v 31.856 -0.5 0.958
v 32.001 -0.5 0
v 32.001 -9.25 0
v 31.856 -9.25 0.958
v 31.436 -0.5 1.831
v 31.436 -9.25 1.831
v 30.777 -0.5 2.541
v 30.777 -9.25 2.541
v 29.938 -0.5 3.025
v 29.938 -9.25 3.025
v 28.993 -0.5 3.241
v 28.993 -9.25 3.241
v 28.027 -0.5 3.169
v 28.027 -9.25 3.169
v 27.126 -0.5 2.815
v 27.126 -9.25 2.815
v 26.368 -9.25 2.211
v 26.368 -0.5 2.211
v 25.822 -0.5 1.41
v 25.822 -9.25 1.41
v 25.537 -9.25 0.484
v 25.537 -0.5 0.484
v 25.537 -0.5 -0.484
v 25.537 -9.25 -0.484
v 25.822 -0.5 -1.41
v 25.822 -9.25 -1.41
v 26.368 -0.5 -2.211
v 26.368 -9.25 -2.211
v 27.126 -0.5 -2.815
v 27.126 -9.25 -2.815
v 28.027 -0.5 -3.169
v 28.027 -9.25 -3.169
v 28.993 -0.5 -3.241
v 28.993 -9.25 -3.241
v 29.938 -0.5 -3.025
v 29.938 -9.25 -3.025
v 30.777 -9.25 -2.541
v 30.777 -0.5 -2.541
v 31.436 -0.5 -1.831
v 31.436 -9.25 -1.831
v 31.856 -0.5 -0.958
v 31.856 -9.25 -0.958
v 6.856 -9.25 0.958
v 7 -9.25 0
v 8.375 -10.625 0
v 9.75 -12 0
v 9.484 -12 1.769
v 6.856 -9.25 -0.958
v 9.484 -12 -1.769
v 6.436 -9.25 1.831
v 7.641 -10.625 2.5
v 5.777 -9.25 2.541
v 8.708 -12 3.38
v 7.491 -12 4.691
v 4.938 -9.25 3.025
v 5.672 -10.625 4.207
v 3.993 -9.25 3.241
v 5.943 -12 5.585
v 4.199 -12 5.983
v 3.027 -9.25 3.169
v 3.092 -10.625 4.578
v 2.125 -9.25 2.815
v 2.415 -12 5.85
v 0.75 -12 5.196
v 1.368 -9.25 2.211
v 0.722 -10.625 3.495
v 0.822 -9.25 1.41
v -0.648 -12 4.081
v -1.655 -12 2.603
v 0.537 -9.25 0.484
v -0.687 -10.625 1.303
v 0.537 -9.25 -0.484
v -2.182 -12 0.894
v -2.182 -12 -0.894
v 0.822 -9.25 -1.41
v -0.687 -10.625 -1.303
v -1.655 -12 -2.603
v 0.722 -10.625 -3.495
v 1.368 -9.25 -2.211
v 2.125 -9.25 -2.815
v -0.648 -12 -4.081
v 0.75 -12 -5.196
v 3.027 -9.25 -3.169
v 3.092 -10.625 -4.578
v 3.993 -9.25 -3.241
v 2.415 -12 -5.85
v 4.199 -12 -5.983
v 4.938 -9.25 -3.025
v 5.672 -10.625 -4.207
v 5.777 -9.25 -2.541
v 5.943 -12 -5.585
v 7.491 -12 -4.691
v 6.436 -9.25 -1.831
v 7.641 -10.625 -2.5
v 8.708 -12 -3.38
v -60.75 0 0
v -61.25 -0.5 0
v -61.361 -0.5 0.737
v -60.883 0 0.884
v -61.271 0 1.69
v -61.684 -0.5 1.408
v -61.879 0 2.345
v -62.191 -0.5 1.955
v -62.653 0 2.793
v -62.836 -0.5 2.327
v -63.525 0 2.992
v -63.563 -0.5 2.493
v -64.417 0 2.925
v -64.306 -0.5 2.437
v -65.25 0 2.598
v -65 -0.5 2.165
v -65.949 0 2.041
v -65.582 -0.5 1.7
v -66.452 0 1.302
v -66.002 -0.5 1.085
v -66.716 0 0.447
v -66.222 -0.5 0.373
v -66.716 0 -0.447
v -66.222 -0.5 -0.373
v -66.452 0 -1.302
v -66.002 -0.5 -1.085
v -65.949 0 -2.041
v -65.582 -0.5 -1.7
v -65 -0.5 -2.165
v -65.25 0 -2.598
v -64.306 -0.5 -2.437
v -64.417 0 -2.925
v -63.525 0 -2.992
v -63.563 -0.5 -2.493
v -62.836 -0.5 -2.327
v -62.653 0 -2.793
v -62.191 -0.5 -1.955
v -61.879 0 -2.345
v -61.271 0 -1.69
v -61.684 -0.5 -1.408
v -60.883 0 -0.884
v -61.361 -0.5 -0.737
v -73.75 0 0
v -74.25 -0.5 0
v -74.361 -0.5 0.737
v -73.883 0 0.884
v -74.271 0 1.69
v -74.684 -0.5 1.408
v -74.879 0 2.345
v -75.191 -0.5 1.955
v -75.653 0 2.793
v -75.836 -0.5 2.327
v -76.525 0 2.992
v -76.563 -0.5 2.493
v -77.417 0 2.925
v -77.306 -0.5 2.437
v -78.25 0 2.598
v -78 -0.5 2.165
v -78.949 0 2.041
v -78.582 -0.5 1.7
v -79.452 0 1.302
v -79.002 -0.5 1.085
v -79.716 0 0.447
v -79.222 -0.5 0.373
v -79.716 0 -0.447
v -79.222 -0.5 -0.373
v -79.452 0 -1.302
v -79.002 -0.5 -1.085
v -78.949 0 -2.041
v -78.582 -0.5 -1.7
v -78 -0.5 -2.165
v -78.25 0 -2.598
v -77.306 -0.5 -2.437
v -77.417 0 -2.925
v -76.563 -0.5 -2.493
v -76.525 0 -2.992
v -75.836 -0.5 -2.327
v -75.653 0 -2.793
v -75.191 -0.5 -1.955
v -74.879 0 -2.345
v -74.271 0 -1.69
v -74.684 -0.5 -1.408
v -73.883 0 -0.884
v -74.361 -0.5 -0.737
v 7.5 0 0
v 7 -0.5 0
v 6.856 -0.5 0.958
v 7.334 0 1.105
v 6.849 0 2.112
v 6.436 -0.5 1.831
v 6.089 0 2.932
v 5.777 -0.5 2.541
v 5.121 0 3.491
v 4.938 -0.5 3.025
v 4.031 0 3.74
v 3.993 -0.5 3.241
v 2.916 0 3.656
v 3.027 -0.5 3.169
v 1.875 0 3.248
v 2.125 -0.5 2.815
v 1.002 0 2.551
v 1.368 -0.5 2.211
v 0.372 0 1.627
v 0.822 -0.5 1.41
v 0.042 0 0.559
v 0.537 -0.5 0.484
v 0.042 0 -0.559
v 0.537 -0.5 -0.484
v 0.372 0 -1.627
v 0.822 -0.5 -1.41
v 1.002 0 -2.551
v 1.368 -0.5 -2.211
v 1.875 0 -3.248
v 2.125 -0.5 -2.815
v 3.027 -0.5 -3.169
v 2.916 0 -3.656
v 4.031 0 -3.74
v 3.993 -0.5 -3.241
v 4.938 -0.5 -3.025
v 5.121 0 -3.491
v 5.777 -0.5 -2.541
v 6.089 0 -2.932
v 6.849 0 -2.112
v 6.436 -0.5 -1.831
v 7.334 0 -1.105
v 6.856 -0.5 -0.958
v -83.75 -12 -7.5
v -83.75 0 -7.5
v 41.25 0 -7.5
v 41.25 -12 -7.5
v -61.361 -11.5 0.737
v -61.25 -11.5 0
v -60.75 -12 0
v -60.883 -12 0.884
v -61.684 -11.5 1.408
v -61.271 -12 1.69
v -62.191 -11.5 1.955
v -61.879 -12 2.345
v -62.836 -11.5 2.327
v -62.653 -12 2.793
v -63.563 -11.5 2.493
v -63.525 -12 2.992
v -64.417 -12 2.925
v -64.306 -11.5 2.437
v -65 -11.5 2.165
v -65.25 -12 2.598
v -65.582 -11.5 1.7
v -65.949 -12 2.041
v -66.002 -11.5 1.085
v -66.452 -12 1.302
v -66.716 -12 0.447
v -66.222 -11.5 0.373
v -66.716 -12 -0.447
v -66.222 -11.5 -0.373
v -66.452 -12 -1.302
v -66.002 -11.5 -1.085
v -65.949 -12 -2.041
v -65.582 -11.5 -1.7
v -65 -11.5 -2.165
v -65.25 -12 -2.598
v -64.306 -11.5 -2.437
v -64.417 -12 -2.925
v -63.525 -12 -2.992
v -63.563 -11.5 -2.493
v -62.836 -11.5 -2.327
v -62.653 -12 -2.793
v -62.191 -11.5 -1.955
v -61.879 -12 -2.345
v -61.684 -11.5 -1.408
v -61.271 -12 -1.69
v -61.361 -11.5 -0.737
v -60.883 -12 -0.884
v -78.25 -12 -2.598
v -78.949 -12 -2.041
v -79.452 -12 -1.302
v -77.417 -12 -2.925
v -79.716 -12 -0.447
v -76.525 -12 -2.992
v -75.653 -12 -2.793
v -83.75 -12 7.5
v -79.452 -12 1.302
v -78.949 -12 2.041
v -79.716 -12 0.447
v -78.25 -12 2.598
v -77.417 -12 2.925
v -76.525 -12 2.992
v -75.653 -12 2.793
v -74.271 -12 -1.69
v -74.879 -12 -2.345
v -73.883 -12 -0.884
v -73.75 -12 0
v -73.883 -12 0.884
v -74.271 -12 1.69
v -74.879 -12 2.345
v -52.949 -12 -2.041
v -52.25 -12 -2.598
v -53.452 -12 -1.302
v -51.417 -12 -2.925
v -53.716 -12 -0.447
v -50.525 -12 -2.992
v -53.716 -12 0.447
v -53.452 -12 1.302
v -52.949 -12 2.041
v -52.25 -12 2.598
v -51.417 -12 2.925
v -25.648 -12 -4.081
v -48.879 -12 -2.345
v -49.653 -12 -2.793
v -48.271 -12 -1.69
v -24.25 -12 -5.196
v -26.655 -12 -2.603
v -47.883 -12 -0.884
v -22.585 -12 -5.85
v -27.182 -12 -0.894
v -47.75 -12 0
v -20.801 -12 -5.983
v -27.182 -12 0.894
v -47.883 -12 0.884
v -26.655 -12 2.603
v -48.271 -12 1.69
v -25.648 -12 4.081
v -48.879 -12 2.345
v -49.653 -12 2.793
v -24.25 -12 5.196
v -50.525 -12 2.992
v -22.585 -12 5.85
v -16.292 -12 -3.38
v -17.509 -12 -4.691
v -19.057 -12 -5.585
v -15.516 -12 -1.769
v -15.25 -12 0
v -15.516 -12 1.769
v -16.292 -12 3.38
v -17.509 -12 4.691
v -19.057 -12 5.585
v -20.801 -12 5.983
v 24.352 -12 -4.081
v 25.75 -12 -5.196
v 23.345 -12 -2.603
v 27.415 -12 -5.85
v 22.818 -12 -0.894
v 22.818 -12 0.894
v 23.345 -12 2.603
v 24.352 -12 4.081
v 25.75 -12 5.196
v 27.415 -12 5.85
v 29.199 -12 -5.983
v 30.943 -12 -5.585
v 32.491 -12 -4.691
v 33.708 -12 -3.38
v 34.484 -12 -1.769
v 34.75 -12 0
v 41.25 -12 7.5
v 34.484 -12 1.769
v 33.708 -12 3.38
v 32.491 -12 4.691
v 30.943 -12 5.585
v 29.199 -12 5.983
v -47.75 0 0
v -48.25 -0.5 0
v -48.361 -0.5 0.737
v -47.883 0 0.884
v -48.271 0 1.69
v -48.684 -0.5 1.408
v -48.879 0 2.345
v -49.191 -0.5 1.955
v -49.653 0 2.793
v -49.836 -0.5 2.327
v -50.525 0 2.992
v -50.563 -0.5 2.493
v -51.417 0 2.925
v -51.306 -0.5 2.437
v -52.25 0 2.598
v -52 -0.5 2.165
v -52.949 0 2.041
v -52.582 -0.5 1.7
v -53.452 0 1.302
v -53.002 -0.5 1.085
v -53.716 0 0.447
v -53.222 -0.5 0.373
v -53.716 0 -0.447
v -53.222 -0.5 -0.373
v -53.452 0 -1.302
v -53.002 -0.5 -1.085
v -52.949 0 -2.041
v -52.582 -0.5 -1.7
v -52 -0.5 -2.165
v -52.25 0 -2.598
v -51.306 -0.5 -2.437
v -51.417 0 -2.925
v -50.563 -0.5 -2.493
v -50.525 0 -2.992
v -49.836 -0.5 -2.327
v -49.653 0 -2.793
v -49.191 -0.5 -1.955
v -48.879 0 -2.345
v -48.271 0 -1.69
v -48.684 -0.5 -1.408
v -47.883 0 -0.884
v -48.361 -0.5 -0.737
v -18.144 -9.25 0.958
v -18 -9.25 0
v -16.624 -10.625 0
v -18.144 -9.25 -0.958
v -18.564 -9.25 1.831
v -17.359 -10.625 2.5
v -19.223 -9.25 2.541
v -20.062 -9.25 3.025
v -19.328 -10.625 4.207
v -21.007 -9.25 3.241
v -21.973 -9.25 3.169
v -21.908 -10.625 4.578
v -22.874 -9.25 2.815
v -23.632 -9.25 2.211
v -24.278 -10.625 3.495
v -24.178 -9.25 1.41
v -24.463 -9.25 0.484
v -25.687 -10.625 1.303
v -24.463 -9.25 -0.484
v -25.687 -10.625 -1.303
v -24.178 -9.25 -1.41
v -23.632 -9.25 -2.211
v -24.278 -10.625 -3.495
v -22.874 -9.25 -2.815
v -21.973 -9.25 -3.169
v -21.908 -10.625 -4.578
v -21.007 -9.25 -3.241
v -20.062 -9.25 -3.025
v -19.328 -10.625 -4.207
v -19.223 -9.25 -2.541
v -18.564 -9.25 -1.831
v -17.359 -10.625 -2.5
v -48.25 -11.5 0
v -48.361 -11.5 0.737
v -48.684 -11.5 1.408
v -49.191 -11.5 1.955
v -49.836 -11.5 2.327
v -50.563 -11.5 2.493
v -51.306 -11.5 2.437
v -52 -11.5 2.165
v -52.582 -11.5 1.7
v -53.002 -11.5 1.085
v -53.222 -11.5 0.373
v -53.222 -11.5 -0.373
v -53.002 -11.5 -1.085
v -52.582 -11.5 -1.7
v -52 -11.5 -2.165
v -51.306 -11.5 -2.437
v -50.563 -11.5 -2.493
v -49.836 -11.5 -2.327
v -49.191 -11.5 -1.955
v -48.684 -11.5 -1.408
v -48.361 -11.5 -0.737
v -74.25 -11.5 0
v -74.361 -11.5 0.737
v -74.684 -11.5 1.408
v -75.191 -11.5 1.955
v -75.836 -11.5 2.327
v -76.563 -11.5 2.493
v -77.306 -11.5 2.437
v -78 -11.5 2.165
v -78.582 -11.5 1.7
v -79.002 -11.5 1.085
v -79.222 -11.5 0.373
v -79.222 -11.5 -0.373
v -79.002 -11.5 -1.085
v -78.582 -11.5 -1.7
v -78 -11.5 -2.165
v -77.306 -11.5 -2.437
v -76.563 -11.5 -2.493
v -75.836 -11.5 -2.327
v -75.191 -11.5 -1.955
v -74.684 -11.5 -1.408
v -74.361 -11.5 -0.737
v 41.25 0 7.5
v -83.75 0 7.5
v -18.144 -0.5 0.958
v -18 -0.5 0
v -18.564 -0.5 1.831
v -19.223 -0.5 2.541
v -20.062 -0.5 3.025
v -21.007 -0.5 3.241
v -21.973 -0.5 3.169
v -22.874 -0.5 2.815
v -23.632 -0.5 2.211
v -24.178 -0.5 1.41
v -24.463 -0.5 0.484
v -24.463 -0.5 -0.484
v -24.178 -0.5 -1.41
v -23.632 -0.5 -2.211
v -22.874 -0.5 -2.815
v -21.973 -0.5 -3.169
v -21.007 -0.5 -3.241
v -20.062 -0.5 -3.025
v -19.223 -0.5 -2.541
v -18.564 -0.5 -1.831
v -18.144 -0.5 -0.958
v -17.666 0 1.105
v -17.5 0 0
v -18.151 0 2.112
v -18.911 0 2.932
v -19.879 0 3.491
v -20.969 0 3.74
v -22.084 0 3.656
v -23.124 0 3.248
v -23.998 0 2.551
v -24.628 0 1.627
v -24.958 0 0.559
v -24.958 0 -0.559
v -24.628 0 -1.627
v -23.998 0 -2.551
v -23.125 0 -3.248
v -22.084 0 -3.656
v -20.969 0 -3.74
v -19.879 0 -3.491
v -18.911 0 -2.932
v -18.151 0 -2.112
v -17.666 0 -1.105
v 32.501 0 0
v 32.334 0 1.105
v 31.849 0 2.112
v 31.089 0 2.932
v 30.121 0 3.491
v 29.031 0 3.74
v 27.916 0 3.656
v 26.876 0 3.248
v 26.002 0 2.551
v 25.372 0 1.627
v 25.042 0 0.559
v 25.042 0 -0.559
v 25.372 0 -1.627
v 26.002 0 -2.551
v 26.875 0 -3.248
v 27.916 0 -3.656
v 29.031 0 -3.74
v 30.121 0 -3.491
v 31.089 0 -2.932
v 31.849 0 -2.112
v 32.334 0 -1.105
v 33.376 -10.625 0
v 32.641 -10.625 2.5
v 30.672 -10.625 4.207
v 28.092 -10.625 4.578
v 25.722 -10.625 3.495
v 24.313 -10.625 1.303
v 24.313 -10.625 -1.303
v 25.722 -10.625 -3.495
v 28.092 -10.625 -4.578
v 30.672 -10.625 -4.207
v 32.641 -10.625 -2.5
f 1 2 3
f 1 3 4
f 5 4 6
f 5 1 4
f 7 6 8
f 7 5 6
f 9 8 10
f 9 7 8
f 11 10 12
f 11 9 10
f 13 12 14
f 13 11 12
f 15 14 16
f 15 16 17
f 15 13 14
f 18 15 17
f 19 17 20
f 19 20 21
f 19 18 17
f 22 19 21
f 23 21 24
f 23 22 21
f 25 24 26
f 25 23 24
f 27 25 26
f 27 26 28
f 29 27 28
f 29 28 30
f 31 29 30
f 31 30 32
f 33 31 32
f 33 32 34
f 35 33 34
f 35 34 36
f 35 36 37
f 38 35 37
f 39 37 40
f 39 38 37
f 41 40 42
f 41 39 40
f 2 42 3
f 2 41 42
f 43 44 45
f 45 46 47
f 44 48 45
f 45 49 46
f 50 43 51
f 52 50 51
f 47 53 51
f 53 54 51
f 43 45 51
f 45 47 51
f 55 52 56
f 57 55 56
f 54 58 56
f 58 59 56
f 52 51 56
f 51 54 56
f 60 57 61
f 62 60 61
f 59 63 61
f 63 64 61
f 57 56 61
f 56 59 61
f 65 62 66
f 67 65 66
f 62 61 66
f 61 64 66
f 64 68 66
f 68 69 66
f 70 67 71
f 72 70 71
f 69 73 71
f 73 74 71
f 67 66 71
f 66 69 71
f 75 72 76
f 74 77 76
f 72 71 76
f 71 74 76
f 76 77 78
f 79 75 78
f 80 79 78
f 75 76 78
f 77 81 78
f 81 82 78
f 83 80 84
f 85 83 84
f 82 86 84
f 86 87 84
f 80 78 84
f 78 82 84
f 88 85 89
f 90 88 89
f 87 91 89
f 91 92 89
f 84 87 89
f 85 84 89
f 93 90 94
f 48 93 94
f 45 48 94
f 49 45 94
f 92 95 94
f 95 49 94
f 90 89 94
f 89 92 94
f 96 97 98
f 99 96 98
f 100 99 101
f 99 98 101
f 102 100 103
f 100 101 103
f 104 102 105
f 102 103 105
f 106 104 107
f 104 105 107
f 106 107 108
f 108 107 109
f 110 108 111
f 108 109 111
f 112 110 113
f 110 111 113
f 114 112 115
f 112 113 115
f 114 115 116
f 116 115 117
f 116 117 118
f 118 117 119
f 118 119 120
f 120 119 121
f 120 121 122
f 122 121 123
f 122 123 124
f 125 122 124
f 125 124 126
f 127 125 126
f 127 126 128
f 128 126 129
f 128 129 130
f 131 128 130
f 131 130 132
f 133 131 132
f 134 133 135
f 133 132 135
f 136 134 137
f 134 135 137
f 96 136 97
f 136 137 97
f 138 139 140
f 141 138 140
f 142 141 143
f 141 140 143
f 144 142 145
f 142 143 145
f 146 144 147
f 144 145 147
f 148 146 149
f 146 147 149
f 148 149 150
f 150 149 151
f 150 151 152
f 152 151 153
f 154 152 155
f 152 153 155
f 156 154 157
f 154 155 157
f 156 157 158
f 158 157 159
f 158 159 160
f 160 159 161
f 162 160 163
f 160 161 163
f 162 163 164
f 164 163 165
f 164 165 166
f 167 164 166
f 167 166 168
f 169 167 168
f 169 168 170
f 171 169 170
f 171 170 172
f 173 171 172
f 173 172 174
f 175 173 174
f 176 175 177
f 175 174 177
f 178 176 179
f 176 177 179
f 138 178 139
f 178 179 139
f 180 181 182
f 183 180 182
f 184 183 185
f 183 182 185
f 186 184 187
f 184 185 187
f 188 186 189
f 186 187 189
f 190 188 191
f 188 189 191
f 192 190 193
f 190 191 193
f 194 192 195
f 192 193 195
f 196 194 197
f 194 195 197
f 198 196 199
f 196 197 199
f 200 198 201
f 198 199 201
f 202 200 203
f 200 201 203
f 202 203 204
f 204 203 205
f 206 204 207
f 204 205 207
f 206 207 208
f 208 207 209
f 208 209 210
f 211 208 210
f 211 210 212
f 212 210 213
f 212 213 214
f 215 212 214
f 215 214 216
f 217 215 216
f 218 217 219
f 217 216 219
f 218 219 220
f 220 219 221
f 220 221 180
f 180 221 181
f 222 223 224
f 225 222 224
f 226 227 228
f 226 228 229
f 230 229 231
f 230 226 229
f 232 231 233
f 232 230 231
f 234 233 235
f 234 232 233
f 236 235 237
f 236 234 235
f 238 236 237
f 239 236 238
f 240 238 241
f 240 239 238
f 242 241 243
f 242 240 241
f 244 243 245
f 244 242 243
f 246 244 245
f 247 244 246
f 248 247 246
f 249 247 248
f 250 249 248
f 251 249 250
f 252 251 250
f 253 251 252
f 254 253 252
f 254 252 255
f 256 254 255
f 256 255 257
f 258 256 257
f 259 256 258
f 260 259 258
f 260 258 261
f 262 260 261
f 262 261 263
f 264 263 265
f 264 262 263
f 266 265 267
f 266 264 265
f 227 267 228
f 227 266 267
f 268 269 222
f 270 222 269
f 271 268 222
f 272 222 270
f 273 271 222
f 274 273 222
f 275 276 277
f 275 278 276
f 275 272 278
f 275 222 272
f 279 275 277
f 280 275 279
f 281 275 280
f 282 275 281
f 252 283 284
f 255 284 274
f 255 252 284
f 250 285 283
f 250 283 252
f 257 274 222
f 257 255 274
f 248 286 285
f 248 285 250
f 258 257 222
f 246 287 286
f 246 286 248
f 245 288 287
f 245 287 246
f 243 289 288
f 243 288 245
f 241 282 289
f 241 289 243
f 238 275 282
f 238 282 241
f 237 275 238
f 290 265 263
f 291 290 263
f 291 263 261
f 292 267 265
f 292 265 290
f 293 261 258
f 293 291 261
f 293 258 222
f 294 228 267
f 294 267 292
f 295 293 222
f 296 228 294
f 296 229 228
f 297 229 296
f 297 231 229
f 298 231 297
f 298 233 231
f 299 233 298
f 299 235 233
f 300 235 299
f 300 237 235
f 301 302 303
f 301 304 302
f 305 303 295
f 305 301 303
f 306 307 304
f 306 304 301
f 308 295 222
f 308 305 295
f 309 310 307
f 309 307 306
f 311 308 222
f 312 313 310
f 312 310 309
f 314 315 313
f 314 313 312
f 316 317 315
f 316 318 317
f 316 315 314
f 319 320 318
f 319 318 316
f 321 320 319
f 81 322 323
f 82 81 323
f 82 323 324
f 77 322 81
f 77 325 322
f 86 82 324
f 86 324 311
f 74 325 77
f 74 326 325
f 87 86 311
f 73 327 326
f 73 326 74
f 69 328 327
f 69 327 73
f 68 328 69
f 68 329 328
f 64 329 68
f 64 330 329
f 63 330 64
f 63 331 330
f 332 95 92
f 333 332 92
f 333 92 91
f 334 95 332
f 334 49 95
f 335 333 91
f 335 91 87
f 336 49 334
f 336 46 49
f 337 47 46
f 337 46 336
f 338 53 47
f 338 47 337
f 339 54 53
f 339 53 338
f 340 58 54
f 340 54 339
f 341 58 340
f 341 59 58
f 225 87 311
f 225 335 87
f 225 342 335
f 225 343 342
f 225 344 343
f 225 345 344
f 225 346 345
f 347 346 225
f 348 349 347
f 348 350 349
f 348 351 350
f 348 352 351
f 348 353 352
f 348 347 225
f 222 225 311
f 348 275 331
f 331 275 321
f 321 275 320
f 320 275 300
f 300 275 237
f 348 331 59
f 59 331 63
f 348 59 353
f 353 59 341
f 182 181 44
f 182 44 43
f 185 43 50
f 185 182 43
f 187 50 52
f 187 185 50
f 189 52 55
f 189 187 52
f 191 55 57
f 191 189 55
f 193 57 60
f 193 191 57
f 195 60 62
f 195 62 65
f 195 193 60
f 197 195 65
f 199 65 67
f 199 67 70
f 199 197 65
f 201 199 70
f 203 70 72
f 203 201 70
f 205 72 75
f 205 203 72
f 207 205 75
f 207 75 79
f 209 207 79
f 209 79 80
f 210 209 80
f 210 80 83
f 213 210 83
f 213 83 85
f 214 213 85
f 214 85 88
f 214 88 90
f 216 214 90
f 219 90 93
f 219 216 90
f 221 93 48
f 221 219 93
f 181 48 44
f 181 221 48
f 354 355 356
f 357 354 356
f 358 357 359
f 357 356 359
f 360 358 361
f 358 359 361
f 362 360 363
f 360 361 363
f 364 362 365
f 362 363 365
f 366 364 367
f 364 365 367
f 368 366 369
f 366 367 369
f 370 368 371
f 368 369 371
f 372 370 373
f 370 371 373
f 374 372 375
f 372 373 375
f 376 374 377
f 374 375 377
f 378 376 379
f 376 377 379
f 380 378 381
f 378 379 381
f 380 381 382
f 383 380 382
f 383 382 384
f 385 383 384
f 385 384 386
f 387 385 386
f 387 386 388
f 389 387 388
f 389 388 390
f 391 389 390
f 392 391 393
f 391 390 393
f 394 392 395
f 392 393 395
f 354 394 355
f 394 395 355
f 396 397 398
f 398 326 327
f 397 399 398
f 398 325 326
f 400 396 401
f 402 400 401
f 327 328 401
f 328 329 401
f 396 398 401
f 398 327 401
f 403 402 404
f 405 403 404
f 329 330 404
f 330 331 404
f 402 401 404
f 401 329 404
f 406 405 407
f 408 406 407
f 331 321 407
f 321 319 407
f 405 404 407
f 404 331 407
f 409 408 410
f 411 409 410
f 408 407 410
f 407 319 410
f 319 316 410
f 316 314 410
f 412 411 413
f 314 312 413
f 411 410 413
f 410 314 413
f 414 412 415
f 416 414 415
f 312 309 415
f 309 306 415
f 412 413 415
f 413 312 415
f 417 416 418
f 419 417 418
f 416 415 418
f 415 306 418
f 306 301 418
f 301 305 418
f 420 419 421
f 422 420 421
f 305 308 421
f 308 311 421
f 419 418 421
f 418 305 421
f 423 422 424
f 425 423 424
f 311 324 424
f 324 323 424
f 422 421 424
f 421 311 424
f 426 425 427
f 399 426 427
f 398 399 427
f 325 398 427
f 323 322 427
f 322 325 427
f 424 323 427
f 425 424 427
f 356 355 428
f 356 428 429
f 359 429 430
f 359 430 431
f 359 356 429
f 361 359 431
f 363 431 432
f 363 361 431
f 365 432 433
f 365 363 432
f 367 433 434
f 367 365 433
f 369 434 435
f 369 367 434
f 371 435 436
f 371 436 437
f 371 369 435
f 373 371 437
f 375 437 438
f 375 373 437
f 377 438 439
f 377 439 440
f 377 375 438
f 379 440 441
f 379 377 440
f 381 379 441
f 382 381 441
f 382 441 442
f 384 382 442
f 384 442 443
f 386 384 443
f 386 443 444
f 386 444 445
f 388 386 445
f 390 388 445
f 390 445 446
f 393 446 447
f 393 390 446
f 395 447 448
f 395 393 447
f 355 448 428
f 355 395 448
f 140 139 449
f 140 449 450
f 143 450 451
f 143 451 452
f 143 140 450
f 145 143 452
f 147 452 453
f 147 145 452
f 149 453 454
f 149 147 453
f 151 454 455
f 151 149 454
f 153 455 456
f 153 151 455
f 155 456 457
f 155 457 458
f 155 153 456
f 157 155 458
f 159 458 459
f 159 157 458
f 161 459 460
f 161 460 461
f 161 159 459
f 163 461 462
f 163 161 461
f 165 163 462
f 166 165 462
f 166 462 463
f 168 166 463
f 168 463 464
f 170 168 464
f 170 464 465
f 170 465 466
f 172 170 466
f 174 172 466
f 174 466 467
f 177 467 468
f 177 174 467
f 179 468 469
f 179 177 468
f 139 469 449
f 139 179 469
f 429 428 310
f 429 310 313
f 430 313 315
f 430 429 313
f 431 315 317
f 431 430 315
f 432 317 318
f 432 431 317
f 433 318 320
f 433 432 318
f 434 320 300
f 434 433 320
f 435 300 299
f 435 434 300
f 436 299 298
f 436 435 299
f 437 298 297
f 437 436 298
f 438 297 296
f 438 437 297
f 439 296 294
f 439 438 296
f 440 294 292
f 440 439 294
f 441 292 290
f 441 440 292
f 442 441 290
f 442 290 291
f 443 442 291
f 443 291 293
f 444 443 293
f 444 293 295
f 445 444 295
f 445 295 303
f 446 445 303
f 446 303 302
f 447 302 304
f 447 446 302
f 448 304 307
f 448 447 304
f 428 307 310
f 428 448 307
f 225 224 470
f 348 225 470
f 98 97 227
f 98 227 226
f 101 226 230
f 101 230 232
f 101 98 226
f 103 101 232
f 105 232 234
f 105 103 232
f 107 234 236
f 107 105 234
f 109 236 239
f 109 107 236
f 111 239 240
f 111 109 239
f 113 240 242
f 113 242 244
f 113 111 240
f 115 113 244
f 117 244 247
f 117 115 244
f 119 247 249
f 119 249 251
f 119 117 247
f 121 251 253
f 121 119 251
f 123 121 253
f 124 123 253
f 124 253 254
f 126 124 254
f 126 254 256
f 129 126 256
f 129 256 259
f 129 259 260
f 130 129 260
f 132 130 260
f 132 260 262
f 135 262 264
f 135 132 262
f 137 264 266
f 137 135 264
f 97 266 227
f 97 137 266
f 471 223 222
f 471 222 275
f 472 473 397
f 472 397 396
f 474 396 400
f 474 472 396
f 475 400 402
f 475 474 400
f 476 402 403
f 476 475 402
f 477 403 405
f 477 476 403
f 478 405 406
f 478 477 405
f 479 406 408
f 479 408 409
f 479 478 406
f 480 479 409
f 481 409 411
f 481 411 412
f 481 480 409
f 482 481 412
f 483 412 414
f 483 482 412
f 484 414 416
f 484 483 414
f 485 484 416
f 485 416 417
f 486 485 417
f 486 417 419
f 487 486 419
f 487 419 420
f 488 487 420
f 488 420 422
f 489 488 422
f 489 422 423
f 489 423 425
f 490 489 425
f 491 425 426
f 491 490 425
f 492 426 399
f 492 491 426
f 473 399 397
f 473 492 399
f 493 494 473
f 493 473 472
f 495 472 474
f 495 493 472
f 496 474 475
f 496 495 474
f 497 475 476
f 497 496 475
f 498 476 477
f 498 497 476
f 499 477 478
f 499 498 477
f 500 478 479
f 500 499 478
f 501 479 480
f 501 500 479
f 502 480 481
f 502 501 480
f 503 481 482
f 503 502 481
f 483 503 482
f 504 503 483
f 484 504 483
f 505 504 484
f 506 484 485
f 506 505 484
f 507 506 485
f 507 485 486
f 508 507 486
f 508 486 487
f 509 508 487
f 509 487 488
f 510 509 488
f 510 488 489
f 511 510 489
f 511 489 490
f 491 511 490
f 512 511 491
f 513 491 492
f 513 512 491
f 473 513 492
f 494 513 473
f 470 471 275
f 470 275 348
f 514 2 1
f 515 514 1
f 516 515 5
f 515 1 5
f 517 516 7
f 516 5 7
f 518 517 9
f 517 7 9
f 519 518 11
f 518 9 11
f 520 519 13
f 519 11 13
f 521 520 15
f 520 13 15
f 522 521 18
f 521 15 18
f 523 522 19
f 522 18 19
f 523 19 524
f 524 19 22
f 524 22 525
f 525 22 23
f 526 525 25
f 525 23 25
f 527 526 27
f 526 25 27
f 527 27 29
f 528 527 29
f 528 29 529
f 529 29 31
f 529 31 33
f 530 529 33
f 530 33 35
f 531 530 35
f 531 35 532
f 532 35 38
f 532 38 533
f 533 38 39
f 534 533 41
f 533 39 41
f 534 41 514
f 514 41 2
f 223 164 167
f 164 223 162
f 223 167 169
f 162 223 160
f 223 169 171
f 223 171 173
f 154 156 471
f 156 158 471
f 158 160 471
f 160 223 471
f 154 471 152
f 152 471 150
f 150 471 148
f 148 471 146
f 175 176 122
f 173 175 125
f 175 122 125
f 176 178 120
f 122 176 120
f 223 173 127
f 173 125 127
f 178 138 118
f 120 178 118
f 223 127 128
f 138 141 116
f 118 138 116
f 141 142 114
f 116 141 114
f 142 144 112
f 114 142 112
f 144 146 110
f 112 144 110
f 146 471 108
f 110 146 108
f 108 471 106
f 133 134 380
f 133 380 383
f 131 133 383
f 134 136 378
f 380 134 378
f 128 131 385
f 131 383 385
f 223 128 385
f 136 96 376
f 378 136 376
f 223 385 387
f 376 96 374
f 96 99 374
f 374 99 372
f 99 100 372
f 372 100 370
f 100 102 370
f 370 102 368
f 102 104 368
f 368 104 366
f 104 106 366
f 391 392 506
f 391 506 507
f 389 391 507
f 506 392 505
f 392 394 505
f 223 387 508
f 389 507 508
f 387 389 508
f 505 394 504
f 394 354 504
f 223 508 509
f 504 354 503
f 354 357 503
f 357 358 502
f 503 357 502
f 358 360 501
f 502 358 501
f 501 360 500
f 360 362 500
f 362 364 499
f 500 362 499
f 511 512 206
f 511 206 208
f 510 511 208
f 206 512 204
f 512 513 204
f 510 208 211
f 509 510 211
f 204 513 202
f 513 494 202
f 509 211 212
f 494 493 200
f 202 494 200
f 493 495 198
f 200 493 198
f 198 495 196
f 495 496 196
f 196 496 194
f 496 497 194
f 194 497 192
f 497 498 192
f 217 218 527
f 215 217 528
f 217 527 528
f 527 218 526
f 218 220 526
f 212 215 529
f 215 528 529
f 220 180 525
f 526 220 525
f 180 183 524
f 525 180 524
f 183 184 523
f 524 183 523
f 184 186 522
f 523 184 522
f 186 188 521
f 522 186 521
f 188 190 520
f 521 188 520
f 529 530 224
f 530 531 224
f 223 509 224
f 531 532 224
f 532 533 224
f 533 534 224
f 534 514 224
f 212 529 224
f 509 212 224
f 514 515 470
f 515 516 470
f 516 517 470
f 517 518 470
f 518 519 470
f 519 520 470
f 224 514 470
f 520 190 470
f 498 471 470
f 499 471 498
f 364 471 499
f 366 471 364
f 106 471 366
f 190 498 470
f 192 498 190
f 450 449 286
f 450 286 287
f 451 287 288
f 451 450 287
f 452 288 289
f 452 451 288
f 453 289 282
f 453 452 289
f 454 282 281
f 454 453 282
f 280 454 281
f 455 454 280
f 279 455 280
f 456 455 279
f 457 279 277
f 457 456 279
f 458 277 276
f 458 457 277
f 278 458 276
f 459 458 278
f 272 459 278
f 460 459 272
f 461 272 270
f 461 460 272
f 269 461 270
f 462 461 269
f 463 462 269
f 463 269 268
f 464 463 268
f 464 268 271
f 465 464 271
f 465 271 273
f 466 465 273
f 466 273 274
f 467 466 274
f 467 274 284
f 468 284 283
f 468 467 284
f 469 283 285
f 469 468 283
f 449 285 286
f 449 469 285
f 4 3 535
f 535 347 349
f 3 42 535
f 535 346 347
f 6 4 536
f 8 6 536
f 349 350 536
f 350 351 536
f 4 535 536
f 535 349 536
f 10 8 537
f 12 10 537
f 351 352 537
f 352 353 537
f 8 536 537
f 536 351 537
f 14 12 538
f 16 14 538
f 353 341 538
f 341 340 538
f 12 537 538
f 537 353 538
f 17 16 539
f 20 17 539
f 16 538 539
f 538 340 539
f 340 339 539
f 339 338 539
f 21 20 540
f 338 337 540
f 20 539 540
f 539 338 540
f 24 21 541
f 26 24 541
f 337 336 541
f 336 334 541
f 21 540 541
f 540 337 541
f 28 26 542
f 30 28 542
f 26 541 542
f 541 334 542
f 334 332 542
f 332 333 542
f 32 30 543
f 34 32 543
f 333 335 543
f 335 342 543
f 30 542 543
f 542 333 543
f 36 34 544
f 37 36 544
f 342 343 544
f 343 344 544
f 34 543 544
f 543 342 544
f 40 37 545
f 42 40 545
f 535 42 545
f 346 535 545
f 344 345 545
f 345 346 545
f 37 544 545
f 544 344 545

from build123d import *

# Parameters (mm, degrees)
F0_W     = 125
F0_H     = 15
F0_R     = 2.5
F0_R_2   = 3.25
F1_DEPTH = 12
F2_SIZE  = 2.75
F3_SIZE  = 0.5


with BuildPart() as f1:
    # F0 (on Front) → F1 (new body)
    with BuildSketch(Plane.XZ):
        with Locations((-21.2495, 0)):
            Rectangle(F0_W, F0_H)
        with Locations((-76.7495, 0)):
            Circle(F0_R, mode=Mode.SUBTRACT)
        with Locations((-63.7495, 0)):
            Circle(F0_R, mode=Mode.SUBTRACT)
        with Locations((-50.7495, 0)):
            Circle(F0_R, mode=Mode.SUBTRACT)
        with Locations((-21.2495, 0)):
            Circle(F0_R_2, mode=Mode.SUBTRACT)
        with Locations((3.7505, 0)):
            Circle(F0_R_2, mode=Mode.SUBTRACT)
        with Locations((28.7505, 0)):
            Circle(F0_R_2, mode=Mode.SUBTRACT)
    extrude(amount=F1_DEPTH)

    # F2
    f2_edges = [f1.edges().sort_by_distance(p)[0] for p in [
        (-24.4995, -12, 0),
        (0.5005, -12, 0),
        (25.5005, -12, 0),
    ]]
    chamfer(f2_edges, length=F2_SIZE)

    # F3
    f3_edges = [f1.edges().sort_by_distance(p)[0] for p in [
        (-79.2495, -12, 0),
        (-66.2495, -12, 0),
        (-53.2495, -12, 0),
        (0.5005, 0, 0),
        (25.5005, 0, 0),
        (-24.4995, 0, 0),
        (-53.2495, 0, 0),
        (-66.2495, 0, 0),
        (-79.2495, 0, 0),
    ]]
    chamfer(f3_edges, length=F3_SIZE)


solid = f1.part
